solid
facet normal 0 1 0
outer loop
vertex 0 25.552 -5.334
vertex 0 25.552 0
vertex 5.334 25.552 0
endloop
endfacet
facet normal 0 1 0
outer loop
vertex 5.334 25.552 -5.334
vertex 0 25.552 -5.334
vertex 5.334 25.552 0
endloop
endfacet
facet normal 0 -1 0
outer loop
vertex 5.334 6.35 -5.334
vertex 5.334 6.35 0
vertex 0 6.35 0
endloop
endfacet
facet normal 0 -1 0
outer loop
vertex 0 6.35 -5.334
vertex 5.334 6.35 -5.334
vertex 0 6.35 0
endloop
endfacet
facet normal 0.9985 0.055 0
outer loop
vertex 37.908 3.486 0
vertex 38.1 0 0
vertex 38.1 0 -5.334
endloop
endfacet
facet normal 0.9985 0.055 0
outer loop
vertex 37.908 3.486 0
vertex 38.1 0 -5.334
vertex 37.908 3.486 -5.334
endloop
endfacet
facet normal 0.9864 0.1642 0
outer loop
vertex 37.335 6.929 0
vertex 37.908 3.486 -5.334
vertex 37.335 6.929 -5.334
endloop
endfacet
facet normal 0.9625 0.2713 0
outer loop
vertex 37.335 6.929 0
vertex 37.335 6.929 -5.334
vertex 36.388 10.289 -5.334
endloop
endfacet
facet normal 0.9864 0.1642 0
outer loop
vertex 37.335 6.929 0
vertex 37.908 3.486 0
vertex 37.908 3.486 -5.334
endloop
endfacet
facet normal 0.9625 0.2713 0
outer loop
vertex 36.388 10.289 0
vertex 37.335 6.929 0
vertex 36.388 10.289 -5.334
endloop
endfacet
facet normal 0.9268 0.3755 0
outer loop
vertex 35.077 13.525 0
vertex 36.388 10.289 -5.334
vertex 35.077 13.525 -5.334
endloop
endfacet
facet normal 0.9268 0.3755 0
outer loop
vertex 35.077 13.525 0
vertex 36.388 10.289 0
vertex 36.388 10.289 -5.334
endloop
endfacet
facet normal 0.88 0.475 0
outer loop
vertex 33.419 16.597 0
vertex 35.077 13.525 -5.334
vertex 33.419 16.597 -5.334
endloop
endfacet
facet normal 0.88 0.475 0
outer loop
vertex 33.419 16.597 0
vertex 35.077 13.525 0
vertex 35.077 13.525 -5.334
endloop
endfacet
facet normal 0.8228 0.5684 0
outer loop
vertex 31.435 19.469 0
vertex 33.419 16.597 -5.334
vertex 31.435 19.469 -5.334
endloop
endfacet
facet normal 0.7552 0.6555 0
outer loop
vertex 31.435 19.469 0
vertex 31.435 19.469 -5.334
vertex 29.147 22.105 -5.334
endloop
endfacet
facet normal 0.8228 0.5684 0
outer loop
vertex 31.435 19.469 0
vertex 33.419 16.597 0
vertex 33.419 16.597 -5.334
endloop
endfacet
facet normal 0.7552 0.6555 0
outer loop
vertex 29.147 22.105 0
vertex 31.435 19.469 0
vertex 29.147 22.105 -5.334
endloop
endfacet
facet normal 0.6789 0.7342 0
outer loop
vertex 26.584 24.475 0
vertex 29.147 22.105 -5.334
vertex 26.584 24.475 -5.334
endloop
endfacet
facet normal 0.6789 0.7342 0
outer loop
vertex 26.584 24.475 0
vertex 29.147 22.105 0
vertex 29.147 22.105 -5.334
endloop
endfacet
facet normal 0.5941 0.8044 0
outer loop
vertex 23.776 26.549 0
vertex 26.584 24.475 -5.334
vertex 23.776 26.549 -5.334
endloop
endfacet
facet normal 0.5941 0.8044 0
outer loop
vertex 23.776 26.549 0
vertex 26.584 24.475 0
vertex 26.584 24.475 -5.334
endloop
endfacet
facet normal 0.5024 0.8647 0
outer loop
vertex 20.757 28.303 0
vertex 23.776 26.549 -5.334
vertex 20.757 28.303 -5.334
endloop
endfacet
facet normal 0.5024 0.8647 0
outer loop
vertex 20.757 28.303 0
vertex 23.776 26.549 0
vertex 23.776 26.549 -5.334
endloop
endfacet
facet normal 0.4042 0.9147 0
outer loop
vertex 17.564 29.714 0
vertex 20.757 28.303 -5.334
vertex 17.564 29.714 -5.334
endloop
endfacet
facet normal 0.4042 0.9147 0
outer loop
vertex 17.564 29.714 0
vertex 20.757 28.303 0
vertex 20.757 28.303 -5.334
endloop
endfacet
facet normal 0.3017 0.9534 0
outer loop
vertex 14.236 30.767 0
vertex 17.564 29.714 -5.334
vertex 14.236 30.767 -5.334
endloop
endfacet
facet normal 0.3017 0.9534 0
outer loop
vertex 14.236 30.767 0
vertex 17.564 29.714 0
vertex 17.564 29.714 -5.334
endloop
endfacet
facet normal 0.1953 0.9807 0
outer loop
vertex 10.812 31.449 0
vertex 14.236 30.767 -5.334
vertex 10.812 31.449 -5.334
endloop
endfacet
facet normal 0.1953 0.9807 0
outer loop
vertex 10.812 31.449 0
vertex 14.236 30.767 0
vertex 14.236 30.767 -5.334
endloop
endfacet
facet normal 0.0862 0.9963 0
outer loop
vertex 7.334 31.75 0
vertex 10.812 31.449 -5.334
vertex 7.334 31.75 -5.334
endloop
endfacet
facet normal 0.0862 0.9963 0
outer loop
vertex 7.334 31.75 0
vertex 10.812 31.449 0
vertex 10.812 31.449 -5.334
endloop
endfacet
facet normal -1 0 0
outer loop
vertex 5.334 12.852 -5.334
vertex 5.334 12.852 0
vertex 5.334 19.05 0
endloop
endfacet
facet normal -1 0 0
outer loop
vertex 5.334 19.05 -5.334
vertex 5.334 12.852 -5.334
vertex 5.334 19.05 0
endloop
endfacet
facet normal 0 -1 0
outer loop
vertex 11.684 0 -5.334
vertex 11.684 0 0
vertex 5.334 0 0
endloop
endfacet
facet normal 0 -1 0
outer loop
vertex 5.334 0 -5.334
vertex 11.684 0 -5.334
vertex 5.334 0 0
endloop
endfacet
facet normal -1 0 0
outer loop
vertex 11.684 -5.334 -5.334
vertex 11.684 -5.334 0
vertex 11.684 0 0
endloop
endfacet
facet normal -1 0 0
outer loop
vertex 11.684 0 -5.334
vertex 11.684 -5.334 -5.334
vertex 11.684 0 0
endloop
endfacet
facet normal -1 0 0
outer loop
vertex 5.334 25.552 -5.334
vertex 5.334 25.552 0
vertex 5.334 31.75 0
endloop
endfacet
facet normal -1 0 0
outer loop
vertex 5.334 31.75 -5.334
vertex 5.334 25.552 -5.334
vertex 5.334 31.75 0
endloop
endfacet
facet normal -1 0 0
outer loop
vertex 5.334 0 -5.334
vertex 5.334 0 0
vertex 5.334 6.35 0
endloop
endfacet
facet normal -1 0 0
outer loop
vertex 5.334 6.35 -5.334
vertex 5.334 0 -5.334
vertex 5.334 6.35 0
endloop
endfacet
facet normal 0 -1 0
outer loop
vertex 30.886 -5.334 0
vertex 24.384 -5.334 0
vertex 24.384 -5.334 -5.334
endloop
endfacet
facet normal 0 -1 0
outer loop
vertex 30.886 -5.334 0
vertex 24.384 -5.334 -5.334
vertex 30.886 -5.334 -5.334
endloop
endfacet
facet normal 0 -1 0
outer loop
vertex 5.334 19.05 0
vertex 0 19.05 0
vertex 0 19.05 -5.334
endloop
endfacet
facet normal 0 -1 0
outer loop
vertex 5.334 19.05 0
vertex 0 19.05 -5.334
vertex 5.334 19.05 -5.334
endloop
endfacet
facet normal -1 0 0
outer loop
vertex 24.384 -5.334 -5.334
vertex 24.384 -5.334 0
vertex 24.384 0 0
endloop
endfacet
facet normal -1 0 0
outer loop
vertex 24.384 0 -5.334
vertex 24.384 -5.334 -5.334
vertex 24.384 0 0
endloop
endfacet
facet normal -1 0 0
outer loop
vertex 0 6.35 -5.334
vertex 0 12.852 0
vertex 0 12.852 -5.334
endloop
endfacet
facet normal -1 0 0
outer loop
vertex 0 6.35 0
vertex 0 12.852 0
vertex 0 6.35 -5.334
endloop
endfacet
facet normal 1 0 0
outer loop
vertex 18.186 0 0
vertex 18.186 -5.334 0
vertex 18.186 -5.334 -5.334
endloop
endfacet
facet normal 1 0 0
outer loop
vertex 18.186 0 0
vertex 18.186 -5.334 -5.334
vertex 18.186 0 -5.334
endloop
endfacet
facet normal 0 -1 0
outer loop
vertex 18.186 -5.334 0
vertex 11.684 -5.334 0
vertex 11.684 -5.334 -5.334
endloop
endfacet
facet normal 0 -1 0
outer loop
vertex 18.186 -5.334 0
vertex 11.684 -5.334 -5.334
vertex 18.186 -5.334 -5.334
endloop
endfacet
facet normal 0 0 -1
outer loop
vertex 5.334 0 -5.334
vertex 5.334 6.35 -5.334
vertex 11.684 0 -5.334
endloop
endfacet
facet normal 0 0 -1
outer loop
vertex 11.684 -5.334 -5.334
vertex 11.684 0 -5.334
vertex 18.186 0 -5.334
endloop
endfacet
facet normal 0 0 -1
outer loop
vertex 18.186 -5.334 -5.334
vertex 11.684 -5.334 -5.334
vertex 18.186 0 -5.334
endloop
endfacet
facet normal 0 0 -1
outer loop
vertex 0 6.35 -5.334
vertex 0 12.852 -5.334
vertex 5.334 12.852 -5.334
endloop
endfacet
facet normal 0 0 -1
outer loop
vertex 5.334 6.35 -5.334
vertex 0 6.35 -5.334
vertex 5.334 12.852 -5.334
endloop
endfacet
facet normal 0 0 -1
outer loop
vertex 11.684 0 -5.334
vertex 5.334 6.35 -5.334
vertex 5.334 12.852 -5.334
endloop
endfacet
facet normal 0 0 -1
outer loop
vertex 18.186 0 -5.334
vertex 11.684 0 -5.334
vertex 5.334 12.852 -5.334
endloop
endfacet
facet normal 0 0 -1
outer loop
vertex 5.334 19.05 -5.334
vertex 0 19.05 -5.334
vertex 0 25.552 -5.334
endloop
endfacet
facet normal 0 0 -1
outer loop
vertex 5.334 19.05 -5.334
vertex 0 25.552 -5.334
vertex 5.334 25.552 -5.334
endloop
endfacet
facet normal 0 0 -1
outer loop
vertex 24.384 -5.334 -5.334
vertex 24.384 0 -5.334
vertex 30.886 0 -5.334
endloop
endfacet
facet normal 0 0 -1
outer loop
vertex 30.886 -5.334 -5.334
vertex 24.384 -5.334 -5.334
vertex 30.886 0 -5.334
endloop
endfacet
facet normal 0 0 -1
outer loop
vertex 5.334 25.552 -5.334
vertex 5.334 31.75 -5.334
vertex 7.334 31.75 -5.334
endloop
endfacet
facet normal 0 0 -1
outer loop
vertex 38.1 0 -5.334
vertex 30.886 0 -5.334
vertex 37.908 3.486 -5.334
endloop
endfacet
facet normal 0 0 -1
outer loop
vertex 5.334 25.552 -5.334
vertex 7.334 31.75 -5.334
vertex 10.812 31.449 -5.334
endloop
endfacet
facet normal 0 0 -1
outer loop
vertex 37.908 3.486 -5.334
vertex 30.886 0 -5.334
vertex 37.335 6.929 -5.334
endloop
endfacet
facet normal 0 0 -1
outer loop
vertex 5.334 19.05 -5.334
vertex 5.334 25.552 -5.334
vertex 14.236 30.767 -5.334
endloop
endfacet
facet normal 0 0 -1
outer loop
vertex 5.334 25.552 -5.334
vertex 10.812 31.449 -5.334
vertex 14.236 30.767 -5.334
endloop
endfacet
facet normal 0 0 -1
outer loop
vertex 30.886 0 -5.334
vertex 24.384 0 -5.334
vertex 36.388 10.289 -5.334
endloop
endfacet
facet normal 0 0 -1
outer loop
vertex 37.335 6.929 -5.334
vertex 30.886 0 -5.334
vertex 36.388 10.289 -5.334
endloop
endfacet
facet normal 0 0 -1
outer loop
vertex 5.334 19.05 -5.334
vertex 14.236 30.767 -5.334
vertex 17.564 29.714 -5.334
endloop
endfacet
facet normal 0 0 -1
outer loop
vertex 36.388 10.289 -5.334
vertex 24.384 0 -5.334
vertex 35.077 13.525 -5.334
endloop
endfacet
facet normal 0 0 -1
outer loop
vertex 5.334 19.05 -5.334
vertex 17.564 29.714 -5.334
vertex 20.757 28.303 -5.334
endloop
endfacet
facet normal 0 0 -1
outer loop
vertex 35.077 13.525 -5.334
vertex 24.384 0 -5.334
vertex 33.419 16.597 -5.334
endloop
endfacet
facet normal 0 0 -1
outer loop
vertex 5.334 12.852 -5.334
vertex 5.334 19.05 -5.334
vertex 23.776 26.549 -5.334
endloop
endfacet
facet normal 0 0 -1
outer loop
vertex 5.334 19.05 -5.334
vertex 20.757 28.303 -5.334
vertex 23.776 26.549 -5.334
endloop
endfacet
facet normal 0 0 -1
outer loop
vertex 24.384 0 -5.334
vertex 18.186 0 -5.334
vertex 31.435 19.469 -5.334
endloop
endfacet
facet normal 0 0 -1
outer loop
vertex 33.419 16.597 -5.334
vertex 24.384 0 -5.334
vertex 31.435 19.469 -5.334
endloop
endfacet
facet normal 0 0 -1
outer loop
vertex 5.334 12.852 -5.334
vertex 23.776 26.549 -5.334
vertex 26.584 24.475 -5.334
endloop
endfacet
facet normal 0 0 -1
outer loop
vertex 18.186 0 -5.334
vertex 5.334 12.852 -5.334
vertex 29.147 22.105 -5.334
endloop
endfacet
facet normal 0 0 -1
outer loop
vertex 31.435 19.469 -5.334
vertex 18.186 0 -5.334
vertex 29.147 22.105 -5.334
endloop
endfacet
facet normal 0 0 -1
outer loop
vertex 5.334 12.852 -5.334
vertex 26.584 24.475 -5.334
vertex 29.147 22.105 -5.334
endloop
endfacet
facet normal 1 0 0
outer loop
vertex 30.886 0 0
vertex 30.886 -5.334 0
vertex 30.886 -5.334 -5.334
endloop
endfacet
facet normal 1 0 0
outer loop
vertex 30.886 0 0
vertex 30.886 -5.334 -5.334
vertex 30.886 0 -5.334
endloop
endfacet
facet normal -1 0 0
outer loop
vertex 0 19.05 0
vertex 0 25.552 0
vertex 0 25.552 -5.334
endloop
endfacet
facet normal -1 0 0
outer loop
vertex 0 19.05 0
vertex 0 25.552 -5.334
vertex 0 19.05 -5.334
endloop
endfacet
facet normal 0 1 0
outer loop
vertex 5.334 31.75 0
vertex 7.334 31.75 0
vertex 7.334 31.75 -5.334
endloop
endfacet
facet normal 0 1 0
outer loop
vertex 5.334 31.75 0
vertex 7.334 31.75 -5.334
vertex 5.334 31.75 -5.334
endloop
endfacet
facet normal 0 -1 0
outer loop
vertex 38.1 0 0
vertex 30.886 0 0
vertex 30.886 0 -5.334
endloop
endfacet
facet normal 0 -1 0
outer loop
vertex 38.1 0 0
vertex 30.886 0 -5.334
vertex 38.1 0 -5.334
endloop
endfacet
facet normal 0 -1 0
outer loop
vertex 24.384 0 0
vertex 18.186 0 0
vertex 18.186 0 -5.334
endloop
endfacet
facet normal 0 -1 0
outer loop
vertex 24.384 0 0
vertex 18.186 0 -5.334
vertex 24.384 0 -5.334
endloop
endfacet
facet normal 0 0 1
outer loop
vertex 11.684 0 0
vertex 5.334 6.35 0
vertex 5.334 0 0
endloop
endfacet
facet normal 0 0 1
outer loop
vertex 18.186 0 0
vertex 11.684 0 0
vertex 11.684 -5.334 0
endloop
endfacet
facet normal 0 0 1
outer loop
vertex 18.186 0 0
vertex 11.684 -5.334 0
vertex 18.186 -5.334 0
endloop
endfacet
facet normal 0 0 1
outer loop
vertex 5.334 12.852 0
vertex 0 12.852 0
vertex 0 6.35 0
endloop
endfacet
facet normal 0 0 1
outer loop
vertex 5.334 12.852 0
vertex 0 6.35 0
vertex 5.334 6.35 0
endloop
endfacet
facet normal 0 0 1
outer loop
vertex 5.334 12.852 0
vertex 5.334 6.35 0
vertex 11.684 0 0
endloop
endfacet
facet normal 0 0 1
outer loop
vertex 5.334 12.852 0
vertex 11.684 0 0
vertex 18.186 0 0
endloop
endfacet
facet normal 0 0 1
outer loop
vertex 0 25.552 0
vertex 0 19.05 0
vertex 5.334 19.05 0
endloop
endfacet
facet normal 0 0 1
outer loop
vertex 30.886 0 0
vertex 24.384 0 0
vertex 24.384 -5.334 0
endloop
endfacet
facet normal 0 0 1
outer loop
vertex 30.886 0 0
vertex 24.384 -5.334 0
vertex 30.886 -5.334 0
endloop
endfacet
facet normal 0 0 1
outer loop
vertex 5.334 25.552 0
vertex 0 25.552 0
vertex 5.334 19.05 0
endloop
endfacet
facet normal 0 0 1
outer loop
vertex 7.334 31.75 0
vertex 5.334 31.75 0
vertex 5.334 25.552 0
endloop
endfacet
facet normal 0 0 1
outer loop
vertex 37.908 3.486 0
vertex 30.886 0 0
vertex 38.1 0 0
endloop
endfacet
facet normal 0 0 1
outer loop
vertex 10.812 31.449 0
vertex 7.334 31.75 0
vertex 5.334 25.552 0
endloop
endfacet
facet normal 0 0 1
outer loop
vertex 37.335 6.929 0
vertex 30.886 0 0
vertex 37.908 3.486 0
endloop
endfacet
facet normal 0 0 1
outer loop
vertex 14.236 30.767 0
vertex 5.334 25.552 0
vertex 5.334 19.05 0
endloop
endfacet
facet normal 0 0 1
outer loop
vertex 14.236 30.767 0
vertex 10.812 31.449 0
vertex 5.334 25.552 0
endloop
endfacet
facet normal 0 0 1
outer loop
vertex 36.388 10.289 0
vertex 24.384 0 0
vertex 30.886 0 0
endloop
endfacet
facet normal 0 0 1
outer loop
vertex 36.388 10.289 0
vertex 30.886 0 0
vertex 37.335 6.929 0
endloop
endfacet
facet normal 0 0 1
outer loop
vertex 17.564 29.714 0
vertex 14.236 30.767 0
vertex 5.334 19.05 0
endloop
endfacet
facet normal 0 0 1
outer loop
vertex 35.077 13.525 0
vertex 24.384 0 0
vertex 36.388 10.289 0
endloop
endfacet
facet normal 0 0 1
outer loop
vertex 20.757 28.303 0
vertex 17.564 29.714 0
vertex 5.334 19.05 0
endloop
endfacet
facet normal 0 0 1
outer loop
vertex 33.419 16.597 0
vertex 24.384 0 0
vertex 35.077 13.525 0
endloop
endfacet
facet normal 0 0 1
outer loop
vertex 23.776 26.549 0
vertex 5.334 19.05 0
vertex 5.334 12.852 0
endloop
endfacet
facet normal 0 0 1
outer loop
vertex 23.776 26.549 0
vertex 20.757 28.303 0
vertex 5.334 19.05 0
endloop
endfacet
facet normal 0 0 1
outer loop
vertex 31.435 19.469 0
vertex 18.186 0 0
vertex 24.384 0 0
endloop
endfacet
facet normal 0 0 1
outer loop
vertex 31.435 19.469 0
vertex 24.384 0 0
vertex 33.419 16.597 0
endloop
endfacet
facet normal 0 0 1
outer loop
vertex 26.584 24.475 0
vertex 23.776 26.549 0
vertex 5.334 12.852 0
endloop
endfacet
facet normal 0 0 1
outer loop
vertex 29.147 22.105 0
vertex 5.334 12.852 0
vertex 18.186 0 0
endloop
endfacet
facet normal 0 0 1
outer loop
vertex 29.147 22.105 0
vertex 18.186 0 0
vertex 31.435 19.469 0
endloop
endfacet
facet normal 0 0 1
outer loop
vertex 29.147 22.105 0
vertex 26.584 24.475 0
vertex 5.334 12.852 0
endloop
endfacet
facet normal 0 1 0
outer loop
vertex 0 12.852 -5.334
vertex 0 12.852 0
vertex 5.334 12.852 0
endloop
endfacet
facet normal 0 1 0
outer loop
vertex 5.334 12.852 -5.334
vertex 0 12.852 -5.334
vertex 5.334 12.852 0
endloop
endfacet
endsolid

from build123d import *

# Parameters (mm, degrees)
BOSS_EXTRUDE1_DEPTH = 5.334
SKETCH2_W           = 5.334
SKETCH2_H           = 6.1976
SKETCH2_W_2         = 6.1976
SKETCH2_H_2         = 5.334
SKETCH2_W_3         = 7.2136
CUT_EXTRUDE1_DEPTH  = 50.881099186


with BuildPart() as part:
    # Sketch1 → Boss-Extrude1 (new body)
    with BuildSketch(Plane.XY):
        with BuildLine():
            Line((0, 31.75), (0, -5.334))
            Line((0, -5.334), (38.1, -5.334))
            Line((38.1, -5.334), (38.1, 0))
            ThreePointArc((38.1, 0), (29.146926861, 22.105308914), (7.334496124, 31.75))
            Line((7.334496124, 31.75), (5.334, 31.75))
            Line((5.334, 31.75), (0, 31.75))
        make_face()
    extrude(amount=-BOSS_EXTRUDE1_DEPTH)

    # Sketch2 → Cut-Extrude1 (cut, through all)
    with BuildSketch(Plane.XY):
        Polygon((11.684, -5.334), (11.684, 0), (5.334, 0), (5.334, 0.1524), (5.334, 6.35), (0, 6.35), (0, -5.334), align=None)
        with Locations((2.667, 28.6512)):
            Rectangle(SKETCH2_W, SKETCH2_H)
        with Locations((2.667, 15.9512)):
            Rectangle(SKETCH2_W, SKETCH2_H)
        with Locations((21.2852, -2.667)):
            Rectangle(SKETCH2_W_2, SKETCH2_H_2)
        with Locations((34.4932, -2.667)):
            Rectangle(SKETCH2_W_3, SKETCH2_H_2)
    extrude(amount=-CUT_EXTRUDE1_DEPTH, mode=Mode.SUBTRACT)


solid = part.part
